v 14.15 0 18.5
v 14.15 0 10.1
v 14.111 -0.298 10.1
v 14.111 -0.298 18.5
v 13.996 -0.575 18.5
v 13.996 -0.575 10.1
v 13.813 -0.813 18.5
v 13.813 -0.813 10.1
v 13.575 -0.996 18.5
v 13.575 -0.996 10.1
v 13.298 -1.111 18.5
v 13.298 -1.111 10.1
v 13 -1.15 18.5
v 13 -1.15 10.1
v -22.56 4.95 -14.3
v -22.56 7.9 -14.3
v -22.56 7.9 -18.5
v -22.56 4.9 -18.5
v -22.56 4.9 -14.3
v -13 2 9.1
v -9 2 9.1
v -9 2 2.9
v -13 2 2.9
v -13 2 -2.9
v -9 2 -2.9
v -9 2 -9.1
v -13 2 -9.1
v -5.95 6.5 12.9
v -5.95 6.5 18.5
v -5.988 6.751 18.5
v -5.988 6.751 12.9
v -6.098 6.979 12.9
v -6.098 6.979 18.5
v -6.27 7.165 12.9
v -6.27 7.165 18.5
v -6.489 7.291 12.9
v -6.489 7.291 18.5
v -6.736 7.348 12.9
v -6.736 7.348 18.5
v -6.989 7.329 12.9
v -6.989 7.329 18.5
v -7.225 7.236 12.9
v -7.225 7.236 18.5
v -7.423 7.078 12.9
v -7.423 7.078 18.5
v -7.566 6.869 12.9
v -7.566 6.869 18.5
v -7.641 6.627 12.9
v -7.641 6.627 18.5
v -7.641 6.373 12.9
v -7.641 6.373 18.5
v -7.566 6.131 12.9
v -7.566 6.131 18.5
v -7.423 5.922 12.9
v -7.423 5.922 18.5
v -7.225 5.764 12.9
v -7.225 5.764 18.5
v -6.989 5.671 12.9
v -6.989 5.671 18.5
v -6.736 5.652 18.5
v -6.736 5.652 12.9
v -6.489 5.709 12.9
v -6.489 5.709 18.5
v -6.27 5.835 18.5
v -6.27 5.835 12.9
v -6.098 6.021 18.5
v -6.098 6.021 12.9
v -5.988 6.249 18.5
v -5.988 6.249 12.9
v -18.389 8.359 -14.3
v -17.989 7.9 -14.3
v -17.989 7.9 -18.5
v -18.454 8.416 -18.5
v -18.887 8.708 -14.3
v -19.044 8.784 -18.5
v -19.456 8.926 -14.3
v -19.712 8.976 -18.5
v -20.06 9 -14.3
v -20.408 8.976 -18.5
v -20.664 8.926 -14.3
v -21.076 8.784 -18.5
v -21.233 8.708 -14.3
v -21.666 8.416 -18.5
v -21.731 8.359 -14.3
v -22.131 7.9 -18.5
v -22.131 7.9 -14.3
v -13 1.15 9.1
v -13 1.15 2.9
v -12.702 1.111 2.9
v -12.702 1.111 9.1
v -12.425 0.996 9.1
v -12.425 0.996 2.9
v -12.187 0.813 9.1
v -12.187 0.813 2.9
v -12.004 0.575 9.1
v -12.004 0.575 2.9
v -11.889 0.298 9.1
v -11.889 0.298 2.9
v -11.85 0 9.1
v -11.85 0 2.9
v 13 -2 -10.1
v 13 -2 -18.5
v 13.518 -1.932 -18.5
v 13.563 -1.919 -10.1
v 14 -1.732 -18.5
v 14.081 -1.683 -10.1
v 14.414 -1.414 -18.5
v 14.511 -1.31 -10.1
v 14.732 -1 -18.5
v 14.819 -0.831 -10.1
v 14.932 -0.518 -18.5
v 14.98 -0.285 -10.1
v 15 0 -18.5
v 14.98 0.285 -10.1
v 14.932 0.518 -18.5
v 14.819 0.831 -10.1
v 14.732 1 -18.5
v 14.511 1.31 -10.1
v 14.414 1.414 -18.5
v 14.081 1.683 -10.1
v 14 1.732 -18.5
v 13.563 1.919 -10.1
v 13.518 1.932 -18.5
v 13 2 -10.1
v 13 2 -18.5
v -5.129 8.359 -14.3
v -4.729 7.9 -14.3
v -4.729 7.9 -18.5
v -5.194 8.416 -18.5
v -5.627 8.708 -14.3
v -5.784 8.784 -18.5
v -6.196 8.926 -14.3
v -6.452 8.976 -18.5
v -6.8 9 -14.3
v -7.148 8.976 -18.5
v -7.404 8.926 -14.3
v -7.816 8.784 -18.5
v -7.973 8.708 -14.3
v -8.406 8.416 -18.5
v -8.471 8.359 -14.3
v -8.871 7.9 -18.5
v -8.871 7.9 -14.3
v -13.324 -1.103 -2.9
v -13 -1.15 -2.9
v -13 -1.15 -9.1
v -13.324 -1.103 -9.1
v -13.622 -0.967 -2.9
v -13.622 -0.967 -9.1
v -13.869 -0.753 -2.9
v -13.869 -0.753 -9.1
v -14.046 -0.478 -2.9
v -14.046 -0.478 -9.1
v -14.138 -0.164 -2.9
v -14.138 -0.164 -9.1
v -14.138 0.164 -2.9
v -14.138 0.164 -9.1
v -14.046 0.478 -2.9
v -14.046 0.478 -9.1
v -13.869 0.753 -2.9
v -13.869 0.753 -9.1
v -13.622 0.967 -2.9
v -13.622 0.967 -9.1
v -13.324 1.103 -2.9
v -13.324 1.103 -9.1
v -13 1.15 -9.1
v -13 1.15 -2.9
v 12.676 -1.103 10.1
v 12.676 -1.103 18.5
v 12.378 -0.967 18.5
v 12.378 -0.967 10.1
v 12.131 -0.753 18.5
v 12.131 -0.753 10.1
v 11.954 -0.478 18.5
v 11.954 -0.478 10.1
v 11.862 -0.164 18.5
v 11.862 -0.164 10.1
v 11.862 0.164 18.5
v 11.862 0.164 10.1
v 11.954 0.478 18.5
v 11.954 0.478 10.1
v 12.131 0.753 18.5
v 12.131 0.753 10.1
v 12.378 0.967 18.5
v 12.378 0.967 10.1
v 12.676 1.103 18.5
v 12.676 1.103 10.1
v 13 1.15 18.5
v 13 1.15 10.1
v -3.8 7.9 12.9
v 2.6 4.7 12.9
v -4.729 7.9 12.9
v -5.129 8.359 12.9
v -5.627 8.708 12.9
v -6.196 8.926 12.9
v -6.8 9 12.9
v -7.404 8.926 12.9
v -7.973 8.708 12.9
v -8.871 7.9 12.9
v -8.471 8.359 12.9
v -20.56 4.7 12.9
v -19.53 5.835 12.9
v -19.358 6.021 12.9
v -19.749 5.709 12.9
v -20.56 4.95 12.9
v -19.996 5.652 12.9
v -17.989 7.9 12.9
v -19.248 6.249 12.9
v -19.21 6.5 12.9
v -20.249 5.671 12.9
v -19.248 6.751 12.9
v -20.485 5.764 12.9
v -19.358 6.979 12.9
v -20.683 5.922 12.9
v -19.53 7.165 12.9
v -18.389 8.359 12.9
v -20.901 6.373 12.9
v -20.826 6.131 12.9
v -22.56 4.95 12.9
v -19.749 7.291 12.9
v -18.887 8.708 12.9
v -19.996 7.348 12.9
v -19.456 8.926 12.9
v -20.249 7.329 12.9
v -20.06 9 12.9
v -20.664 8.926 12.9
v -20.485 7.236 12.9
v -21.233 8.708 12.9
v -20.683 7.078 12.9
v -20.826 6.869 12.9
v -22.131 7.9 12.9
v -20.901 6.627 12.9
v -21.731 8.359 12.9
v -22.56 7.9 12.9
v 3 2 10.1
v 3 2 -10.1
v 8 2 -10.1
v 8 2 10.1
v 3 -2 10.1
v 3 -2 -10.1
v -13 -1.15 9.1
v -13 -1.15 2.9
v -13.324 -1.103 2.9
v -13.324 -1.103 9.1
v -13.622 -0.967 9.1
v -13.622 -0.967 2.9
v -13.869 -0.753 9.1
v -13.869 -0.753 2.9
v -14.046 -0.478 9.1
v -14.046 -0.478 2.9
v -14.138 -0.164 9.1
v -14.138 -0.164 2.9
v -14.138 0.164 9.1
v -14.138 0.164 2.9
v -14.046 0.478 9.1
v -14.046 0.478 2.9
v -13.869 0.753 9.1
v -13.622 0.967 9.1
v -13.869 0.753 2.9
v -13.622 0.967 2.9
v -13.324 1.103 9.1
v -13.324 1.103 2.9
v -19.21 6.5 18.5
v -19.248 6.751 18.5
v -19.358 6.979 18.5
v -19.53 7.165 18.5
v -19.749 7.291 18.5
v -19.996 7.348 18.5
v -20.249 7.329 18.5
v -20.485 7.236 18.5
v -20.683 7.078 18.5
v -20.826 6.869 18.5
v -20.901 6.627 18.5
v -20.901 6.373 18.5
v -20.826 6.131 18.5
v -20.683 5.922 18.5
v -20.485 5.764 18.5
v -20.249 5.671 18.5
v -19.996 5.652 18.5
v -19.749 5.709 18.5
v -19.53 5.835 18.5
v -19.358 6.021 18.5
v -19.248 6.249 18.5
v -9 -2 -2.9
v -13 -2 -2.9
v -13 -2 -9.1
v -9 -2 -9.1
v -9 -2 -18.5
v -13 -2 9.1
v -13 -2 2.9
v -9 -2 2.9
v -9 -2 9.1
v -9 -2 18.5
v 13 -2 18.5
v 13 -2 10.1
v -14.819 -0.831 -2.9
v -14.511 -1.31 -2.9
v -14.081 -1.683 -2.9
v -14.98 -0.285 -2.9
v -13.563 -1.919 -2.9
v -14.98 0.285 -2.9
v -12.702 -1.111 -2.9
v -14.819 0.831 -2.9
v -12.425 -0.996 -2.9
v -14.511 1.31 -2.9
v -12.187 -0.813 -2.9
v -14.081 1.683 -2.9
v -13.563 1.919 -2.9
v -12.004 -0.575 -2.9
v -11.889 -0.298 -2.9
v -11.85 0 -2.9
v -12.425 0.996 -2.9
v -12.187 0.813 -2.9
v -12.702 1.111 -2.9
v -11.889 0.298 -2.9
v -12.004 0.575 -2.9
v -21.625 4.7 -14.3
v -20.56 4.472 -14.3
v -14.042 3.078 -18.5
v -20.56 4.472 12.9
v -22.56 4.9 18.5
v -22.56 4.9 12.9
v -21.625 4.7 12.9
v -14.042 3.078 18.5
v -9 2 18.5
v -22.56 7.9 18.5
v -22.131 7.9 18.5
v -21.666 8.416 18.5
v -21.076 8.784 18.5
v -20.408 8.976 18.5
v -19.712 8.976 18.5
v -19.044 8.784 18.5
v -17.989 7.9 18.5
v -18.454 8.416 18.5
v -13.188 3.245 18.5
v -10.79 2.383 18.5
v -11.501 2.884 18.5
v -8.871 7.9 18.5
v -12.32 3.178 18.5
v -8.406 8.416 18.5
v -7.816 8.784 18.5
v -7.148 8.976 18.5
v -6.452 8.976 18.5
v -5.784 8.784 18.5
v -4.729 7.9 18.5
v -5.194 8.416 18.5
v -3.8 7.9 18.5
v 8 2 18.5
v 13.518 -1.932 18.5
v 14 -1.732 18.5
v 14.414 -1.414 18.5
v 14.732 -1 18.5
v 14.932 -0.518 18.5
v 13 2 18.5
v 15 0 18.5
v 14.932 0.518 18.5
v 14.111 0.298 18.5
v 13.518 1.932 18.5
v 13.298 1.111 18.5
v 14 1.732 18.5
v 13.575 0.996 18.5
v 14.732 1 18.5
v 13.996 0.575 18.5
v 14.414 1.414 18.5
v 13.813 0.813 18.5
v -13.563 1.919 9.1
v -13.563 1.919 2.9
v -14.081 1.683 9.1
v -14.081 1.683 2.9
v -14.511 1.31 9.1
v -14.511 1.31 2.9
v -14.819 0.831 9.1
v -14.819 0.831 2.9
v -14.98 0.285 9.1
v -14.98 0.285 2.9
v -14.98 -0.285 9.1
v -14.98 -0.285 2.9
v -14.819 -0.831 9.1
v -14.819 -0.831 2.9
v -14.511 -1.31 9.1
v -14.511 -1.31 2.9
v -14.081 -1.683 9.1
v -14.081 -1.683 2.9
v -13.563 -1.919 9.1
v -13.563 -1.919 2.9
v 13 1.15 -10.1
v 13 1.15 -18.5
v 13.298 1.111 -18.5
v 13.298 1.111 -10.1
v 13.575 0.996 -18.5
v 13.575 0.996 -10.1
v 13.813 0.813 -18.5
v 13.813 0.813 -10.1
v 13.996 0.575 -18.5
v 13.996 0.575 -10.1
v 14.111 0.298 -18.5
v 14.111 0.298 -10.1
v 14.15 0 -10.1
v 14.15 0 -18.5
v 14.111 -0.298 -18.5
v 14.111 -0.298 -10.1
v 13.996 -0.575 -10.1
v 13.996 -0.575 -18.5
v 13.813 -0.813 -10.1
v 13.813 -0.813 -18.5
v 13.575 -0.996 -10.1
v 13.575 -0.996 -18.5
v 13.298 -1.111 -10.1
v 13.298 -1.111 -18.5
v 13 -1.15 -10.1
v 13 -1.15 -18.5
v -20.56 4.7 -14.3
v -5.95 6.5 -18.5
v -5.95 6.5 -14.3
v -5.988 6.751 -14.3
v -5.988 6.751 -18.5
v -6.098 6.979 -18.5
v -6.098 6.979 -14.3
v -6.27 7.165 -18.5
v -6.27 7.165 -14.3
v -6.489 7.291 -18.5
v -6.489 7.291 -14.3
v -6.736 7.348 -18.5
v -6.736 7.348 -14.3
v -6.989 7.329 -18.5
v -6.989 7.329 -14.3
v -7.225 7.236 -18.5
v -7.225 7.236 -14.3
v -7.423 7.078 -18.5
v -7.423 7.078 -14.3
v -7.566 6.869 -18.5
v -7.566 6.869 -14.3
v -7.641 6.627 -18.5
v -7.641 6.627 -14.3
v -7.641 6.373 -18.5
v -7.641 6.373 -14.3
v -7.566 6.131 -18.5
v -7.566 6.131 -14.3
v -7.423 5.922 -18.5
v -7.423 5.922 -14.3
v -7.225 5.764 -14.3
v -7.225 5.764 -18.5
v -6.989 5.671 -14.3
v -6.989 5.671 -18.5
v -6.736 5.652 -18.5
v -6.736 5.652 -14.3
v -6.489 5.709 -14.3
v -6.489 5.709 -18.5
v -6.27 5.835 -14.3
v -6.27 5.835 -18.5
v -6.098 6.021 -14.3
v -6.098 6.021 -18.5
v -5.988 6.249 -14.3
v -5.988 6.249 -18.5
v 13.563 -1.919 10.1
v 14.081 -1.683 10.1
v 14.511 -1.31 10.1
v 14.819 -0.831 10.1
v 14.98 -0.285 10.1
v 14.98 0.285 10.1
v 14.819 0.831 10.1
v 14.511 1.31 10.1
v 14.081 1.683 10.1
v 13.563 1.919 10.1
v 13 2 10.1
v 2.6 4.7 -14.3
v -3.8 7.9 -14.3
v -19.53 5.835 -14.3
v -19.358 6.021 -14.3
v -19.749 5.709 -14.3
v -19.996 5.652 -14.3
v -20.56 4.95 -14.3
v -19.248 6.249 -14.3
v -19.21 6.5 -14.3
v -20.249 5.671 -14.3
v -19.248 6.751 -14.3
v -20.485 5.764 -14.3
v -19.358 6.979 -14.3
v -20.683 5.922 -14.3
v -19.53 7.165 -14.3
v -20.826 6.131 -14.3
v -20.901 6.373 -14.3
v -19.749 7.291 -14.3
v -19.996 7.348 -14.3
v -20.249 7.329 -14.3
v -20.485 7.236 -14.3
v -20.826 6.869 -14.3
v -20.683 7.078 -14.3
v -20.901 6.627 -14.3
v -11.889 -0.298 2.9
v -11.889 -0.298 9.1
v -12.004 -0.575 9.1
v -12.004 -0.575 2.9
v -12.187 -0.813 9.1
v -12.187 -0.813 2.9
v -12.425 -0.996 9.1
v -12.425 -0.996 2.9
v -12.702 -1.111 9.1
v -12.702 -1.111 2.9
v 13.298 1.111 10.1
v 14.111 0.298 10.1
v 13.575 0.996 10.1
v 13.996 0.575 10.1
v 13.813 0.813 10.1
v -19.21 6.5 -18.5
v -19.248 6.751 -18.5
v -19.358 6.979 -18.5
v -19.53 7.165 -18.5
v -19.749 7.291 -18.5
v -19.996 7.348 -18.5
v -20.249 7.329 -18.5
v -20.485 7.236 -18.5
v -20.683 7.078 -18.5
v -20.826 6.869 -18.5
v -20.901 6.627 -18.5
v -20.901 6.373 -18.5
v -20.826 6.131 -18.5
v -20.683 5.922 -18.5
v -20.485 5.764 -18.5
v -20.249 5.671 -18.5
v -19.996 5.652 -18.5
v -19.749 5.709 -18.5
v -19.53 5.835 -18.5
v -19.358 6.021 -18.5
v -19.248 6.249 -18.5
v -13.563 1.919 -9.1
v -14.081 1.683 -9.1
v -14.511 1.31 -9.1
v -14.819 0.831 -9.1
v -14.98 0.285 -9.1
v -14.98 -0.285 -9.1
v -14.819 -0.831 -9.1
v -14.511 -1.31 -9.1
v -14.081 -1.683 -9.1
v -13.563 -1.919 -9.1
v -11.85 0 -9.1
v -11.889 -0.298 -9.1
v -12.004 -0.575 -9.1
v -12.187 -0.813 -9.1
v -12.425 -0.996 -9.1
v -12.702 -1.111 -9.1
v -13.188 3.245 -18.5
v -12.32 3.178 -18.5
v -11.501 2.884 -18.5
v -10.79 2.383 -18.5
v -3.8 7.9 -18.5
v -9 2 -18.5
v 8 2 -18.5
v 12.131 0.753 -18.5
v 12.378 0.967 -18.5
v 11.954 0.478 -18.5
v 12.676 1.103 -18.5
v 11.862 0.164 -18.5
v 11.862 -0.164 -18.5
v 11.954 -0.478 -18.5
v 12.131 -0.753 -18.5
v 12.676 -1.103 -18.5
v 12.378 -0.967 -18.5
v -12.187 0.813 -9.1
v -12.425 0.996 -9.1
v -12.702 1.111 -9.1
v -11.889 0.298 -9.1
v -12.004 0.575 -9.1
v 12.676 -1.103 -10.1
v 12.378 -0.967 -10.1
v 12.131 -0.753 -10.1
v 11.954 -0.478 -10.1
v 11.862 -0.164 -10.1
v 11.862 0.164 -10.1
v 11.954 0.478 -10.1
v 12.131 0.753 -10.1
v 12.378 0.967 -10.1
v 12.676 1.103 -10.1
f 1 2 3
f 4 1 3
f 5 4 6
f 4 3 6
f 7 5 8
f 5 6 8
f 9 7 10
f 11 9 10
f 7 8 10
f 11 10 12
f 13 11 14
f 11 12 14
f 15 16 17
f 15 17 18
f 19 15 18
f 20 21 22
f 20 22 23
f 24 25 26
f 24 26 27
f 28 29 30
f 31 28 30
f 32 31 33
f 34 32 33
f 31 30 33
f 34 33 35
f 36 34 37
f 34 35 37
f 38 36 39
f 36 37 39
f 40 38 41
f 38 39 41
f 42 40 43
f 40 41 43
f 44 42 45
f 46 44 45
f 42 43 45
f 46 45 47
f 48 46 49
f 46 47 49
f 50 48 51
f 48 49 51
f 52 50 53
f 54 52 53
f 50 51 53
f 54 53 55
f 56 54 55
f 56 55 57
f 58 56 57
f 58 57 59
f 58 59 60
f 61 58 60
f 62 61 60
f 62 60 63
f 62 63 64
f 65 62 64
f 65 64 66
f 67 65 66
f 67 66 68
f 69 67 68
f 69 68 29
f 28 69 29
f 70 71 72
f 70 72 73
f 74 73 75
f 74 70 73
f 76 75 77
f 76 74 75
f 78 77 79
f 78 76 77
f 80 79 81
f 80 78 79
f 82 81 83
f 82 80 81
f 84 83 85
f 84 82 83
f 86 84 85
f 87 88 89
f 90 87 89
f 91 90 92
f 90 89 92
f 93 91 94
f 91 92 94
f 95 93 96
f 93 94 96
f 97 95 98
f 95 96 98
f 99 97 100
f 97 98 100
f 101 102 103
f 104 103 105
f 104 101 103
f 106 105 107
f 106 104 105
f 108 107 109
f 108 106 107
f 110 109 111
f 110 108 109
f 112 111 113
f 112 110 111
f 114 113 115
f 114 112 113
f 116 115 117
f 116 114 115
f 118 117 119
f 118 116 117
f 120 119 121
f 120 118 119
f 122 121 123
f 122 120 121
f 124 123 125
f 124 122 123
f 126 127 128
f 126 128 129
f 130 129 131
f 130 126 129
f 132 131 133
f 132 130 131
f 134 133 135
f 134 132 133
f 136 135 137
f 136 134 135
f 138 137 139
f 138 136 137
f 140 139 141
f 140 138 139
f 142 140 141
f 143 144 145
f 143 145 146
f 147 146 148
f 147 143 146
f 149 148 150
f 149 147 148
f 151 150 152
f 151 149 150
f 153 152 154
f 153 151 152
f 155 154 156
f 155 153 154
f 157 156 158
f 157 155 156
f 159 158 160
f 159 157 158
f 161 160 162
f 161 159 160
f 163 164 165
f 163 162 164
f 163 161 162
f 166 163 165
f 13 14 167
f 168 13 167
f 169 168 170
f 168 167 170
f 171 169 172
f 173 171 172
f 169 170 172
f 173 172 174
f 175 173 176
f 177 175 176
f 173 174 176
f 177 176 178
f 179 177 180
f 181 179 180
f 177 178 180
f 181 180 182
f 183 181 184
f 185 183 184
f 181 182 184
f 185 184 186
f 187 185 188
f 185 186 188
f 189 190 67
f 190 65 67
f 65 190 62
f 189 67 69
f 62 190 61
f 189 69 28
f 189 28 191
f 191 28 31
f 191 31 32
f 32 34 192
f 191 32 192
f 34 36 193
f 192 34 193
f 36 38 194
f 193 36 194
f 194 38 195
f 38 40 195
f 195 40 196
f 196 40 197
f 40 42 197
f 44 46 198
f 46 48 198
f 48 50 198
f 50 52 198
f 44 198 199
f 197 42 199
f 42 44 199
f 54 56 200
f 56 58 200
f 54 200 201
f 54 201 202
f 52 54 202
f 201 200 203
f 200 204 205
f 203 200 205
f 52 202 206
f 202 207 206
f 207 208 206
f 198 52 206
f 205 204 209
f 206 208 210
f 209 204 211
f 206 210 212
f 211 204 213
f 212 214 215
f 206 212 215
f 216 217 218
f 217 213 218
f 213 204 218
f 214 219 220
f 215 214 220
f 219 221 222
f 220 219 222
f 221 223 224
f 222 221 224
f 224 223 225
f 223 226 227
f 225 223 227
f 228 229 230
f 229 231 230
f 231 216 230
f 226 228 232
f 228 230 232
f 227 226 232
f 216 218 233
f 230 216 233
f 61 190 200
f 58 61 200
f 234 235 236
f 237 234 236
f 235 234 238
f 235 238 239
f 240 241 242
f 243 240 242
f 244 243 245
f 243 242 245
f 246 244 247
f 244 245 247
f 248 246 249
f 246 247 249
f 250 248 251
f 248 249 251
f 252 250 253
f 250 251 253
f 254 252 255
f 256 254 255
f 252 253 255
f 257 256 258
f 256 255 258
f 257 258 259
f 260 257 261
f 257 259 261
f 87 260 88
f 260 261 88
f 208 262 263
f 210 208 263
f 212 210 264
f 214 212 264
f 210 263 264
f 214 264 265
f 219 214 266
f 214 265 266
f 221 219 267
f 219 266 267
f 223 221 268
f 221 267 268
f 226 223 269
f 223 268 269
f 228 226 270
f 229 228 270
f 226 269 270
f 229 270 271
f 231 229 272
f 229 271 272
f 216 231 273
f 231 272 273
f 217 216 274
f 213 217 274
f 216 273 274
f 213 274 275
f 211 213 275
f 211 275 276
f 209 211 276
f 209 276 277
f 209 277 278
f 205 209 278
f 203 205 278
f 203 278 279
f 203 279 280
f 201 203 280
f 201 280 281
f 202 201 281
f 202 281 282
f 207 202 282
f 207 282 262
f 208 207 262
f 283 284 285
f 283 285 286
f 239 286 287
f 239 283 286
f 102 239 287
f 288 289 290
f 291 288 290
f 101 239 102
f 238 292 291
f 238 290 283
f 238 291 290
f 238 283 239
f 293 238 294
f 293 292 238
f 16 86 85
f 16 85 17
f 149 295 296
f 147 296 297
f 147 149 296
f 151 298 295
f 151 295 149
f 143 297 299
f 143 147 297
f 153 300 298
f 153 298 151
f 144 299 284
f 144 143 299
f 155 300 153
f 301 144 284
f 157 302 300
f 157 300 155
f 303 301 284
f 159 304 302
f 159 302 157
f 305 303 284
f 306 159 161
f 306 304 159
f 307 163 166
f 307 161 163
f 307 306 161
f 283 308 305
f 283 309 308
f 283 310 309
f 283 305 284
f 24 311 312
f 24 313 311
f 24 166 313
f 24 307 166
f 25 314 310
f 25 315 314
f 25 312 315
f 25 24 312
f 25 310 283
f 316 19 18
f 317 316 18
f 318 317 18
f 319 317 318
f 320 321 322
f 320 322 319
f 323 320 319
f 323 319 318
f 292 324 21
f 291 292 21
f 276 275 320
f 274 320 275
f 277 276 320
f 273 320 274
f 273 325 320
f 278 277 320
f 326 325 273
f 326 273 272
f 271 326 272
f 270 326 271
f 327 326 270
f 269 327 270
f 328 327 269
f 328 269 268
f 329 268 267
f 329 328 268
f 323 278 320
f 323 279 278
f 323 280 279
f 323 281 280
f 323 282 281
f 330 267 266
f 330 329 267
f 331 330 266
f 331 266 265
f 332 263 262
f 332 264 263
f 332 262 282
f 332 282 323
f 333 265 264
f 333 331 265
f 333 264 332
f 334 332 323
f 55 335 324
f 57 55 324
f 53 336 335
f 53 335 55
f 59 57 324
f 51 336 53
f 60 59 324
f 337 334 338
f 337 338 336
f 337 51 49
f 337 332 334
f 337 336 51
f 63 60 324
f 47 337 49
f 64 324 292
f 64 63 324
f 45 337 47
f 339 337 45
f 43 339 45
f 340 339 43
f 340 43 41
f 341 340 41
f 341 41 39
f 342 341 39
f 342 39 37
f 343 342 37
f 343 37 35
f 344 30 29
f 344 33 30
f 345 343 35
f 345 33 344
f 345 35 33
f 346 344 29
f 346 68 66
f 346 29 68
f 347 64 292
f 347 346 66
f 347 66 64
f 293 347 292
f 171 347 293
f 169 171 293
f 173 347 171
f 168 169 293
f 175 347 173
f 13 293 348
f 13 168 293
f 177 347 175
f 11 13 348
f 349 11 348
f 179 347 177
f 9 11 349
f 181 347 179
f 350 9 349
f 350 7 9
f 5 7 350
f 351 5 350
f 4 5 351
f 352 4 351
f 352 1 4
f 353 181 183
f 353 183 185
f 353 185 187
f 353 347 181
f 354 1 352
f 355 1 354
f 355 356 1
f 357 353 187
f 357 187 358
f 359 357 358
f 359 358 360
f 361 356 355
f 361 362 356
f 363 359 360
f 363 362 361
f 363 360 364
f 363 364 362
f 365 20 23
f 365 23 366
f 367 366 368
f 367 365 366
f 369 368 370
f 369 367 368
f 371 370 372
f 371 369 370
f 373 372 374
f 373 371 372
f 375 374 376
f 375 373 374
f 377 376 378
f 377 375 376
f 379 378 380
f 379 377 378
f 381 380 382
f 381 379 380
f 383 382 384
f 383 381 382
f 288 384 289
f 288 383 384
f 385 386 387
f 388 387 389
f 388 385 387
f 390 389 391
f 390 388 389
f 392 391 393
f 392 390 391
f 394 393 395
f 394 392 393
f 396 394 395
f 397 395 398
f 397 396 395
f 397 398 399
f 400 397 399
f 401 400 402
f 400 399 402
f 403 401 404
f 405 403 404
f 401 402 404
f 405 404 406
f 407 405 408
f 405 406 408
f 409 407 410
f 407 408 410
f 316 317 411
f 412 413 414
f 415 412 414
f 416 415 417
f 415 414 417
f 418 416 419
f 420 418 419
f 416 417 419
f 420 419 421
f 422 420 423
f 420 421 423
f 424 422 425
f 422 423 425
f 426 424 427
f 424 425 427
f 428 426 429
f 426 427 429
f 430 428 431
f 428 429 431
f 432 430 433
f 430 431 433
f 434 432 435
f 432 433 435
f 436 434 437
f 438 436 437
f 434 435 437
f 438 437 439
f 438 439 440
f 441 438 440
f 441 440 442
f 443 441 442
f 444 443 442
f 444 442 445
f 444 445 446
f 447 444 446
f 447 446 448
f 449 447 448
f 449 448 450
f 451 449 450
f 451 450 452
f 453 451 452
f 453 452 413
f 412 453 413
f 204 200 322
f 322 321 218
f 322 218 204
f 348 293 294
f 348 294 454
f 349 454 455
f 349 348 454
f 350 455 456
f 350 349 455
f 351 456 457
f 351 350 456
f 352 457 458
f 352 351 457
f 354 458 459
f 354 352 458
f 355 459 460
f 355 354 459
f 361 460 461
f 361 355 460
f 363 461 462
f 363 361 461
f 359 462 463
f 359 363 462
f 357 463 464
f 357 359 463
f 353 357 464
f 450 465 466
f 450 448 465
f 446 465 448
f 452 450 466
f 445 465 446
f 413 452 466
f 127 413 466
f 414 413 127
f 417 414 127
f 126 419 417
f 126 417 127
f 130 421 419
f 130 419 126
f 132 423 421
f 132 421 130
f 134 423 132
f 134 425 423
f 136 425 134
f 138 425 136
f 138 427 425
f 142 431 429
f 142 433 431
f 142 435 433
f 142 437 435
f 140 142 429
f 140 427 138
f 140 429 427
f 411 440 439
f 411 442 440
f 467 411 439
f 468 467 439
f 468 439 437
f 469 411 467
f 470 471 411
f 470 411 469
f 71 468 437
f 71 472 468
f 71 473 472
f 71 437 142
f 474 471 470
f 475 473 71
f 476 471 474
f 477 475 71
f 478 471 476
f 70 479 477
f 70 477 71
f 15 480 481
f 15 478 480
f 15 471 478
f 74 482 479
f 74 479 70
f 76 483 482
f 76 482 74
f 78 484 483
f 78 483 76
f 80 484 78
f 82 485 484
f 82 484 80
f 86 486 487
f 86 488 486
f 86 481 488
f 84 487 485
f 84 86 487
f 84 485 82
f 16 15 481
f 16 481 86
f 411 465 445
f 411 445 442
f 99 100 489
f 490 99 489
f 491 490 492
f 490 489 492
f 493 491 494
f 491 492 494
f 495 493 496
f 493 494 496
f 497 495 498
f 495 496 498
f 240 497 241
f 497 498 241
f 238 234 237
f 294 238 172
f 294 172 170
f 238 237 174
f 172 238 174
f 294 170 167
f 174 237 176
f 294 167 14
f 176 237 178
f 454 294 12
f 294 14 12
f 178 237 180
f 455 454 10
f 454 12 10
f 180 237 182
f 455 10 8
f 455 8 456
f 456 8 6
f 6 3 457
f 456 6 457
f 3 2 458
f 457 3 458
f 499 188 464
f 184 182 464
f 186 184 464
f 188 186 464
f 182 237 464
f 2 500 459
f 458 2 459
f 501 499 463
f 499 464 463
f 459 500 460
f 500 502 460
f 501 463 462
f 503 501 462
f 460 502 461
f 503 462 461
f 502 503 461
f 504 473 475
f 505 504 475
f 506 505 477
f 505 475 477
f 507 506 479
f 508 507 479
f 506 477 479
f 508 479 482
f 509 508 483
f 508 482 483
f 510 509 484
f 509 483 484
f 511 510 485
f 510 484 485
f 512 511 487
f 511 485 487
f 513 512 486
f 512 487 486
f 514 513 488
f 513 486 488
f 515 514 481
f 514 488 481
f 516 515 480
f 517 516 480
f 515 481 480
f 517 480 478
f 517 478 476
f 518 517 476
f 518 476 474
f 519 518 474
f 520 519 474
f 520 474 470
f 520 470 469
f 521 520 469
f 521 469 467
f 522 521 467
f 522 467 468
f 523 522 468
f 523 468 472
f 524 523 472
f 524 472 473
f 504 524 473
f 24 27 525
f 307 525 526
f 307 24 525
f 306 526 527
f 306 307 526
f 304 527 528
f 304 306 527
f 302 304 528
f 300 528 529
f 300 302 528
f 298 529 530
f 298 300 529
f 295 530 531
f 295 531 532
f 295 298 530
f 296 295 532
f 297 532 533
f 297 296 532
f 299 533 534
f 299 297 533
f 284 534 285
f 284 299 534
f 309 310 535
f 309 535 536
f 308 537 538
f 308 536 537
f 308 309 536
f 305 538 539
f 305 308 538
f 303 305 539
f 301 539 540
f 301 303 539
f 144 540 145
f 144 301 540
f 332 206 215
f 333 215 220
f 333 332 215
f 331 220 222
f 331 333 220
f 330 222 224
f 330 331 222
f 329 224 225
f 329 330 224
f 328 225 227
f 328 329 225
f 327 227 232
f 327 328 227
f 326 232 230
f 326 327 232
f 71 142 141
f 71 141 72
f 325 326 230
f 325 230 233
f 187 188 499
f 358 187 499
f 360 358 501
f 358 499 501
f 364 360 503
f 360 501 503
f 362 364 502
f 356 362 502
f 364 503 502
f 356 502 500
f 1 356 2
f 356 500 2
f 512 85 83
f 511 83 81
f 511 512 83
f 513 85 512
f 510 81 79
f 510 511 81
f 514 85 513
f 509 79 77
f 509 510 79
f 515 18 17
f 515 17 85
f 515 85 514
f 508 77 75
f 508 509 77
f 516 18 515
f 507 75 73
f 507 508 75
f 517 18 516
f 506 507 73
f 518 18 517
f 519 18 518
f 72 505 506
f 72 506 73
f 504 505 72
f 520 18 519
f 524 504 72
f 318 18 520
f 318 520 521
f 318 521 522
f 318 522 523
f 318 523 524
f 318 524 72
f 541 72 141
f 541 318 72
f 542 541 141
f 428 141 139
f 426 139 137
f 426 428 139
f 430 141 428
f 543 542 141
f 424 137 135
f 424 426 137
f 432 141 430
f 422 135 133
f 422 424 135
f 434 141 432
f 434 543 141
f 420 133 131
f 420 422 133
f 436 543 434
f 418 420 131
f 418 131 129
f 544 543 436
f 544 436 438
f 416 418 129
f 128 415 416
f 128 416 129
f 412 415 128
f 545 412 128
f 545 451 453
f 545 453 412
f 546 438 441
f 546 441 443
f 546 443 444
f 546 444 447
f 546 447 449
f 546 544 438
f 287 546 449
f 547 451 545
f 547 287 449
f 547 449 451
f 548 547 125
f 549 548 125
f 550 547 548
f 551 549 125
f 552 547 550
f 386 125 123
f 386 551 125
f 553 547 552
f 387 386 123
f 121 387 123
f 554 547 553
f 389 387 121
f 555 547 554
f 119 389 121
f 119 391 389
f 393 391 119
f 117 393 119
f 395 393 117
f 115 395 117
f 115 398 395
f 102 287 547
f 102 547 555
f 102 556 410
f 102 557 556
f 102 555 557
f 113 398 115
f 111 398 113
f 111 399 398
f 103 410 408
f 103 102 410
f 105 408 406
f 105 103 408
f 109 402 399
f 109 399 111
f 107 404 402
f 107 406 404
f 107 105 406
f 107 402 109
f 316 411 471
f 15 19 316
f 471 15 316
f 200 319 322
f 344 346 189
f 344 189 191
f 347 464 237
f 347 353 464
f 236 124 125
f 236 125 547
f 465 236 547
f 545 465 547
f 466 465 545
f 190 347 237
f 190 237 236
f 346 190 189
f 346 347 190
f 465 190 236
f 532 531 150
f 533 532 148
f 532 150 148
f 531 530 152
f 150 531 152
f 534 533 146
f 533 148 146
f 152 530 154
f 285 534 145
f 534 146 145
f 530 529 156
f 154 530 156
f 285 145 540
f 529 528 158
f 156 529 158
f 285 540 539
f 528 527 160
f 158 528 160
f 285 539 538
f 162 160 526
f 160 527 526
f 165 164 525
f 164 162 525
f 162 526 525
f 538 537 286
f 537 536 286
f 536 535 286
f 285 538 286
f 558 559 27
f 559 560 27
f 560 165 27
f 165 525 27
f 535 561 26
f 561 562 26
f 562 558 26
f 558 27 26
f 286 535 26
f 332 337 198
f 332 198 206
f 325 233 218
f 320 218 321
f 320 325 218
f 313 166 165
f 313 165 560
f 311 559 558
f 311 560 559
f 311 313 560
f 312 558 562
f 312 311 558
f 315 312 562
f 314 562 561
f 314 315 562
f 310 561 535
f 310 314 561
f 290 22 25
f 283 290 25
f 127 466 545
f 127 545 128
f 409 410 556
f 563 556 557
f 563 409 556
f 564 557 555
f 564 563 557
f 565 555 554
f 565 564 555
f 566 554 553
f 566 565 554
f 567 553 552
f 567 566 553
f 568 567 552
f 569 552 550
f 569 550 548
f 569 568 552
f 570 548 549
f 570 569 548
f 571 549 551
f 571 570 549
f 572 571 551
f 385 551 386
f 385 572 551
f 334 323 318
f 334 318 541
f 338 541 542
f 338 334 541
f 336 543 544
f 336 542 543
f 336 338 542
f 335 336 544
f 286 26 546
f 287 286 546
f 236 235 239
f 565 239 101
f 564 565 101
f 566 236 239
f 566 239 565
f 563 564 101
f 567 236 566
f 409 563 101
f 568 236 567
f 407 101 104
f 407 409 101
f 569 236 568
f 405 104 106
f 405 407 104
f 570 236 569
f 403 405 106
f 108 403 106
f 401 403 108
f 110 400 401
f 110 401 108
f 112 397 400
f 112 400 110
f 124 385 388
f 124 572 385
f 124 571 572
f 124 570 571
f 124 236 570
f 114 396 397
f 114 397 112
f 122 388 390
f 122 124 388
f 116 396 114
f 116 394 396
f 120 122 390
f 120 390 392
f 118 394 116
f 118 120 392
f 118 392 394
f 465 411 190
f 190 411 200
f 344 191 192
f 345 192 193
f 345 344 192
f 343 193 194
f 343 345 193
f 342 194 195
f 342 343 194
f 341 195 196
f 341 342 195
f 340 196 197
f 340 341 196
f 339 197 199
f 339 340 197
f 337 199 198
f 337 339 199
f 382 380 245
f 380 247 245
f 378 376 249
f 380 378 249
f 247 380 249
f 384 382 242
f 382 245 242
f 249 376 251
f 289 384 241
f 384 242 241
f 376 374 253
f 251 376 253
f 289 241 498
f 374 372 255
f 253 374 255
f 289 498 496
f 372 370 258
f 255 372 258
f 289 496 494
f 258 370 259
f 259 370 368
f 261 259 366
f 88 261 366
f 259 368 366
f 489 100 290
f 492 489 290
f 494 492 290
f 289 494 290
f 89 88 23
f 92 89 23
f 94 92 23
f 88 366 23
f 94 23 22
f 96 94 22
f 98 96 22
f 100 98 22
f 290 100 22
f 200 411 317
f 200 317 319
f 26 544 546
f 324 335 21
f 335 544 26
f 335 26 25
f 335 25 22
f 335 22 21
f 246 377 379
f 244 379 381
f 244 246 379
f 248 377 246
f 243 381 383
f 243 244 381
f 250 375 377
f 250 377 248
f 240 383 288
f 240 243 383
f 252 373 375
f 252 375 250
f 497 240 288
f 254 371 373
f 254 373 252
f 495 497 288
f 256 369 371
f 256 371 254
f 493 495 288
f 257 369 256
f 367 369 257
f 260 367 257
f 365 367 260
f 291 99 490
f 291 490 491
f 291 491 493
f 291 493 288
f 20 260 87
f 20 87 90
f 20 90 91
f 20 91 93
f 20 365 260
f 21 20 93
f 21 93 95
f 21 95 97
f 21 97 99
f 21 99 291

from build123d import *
from build123d.topology import SkipClean

# Parameters (mm, degrees)
EXTRUDE_1_DEPTH     = 18.5
SKETCH_2_W          = 6
SKETCH_2_H          = 5.8
SKETCH_2_H_2        = 9.4
SKETCH_2_W_2        = 12
SKETCH_2_H_3        = 20.2
CUT_EXTRUDE_1_DEPTH = 25.150569351
EXTRUDE_2_REACH     = 41.975
SKETCH_4_R          = 0.85
SKETCH_5_W          = 27.2
SKETCH_5_H          = 4.3
CUT_EXTRUDE_2_DEPTH = 43.825268242
SKETCH_6_W          = 27.2
SKETCH_6_H          = 0.5
CUT_EXTRUDE_3_DEPTH = 2


with BuildPart() as part:
    # 草图1 → 凸台-拉伸1 (new, symmetric)
    with BuildSketch(Plane.XY):
        with BuildLine():
            ThreePointArc((-11, 0), (-11.585786438, 1.414213562), (-13, 2))
            Line((-13, 2), (-13, 1.15))
            ThreePointArc((-13, 1.15), (-12.186827202, 0.813172798), (-11.85, 0))
            ThreePointArc((-11.85, 0), (-12.186827202, -0.813172798), (-13, -1.15))
            Line((-13, -1.15), (-13, -2))
            ThreePointArc((-13, -2), (-11.585786438, -1.414213562), (-11, 0))
        make_face()
        with BuildLine():
            Line((-13, 1.15), (-13, 2))
            ThreePointArc((-13, 2), (-15, 0), (-13, -2))
            Line((-13, -2), (-13, -1.15))
            ThreePointArc((-13, -1.15), (-14.15, 0), (-13, 1.15))
        make_face()
        with BuildLine():
            ThreePointArc((-11, 0), (-11.585786438, 1.414213562), (-13, 2))
            Line((-13, 2), (-13, 1.15))
            ThreePointArc((-13, 1.15), (-12.186827202, 0.813172798), (-11.85, 0))
            ThreePointArc((-11.85, 0), (-12.186827202, -0.813172798), (-13, -1.15))
            Line((-13, -1.15), (-13, -2))
            ThreePointArc((-13, -2), (-11.585786438, -1.414213562), (-11, 0))
        make_face()
        with BuildLine():
            Line((-13, 1.15), (-13, 2))
            ThreePointArc((-13, 2), (-15, 0), (-13, -2))
            Line((-13, -2), (-13, -1.15))
            ThreePointArc((-13, -1.15), (-14.15, 0), (-13, 1.15))
        make_face()
        with BuildLine():
            Line((13, 2), (-13, 2))
            ThreePointArc((-13, 2), (-11.585786438, 1.414213562), (-11, 0))
            ThreePointArc((-11, 0), (-11.585786438, -1.414213562), (-13, -2))
            Line((-13, -2), (13, -2))
            ThreePointArc((13, -2), (11, 0), (13, 2))
        make_face()
        with BuildLine():
            ThreePointArc((15, 0), (14.414213562, 1.414213562), (13, 2))
            Line((13, 2), (13, 1.15))
            ThreePointArc((13, 1.15), (13.813172798, 0.813172798), (14.15, 0))
            ThreePointArc((14.15, 0), (13.813172798, -0.813172798), (13, -1.15))
            Line((13, -1.15), (13, -2))
            ThreePointArc((13, -2), (14.414213562, -1.414213562), (15, 0))
        make_face()
        with BuildLine():
            Line((13, 1.15), (13, 2))
            ThreePointArc((13, 2), (11, 0), (13, -2))
            Line((13, -2), (13, -1.15))
            ThreePointArc((13, -1.15), (11.85, 0), (13, 1.15))
        make_face()
        with BuildLine():
            ThreePointArc((15, 0), (14.414213562, 1.414213562), (13, 2))
            Line((13, 2), (13, 1.15))
            ThreePointArc((13, 1.15), (13.813172798, 0.813172798), (14.15, 0))
            ThreePointArc((14.15, 0), (13.813172798, -0.813172798), (13, -1.15))
            Line((13, -1.15), (13, -2))
            ThreePointArc((13, -2), (14.414213562, -1.414213562), (15, 0))
        make_face()
        with BuildLine():
            Line((13, 1.15), (13, 2))
            ThreePointArc((13, 2), (11, 0), (13, -2))
            Line((13, -2), (13, -1.15))
            ThreePointArc((13, -1.15), (11.85, 0), (13, 1.15))
        make_face()
    extrude(amount=EXTRUDE_1_DEPTH, both=True)

    # 草图2 → 切除-拉伸1 (cut, through all)
    with SkipClean():  # the faces are left unmerged after this step: merging them gives an invalid solid
        with BuildSketch(Plane(origin=(0, 2, 0), x_dir=(1, 0, 0), z_dir=(0, 1, 0))):
            with Locations((-12, 0)):
                Rectangle(SKETCH_2_W, SKETCH_2_H)
            with Locations((-12, -13.8)):
                Rectangle(SKETCH_2_W, SKETCH_2_H_2)
            with Locations((-12, 13.8)):
                Rectangle(SKETCH_2_W, SKETCH_2_H_2)
            with Locations((9, 0)):
                Rectangle(SKETCH_2_W_2, SKETCH_2_H_3)
        extrude(amount=-CUT_EXTRUDE_1_DEPTH, mode=Mode.SUBTRACT)

    # 凸台-拉伸2: up to this face of the body (flat: up to its plane)
    extrude_2_end = Plane(part.part.faces().sort_by_distance((2.318945453, 0, -18.5))[0])
    # 草图4 → 凸台-拉伸2 (add, up to the picked face)
    with BuildSketch(Plane.XY.offset(18.5), mode=Mode.PRIVATE) as extrude_2_sk1:
        with BuildLine():
            Line((-10.789828689, 2.382780472), (-9, 2))
            Line((-9, 2), (8, 2))
            Line((8, 2), (-3.8, 7.9))
            Line((-3.8, 7.9), (-4.728768482, 7.9))
            ThreePointArc((-4.728768482, 7.9), (-6.8, 9), (-8.871231518, 7.9))
            Line((-8.871231518, 7.9), (-17.988768482, 7.9))
            ThreePointArc((-17.988768482, 7.9), (-20.06, 9), (-22.131231518, 7.9))
            Line((-22.131231518, 7.9), (-22.56, 7.9))
            Line((-22.56, 7.9), (-22.56, 4.9))
            Line((-22.56, 4.9), (-14.042229791, 3.078352979))
            ThreePointArc((-14.042229791, 3.078352979), (-12.320311008, 3.178131979), (-10.789828689, 2.382780472))
        make_face()
        with Locations((-20.06, 6.5)):
            Circle(SKETCH_4_R, mode=Mode.SUBTRACT)
        with Locations((-6.8, 6.5)):
            Circle(SKETCH_4_R, mode=Mode.SUBTRACT)
    extrude_2_tool1 = split(extrude(extrude_2_sk1.sketch, amount=-EXTRUDE_2_REACH, mode=Mode.PRIVATE), bisect_by=extrude_2_end, keep=Keep.BOTH, mode=Mode.PRIVATE)
    add(extrude_2_tool1.solids().sort_by(Axis((-8.777143, 5.120579, 18.5), (0, 0, -1)))[0])

    # 草图5 → 切除-拉伸2 (cut, through all)
    with SkipClean():  # the faces are left unmerged after this step: merging them gives an invalid solid
        with BuildSketch(Plane.ZY.offset(22.56)):
            with Locations((-0.7, 6.85)):
                Rectangle(SKETCH_5_W, SKETCH_5_H)
        extrude(amount=-CUT_EXTRUDE_2_DEPTH, mode=Mode.SUBTRACT)

    # 草图6 → 切除-拉伸3 (cut)
    with SkipClean():  # the faces are left unmerged after this step: merging them gives an invalid solid
        with BuildSketch(Plane.ZY.offset(22.56)):
            with Locations((-0.7, 4.7)):
                Rectangle(SKETCH_6_W, SKETCH_6_H)
        extrude(amount=-CUT_EXTRUDE_3_DEPTH, mode=Mode.SUBTRACT)


solid = part.part
